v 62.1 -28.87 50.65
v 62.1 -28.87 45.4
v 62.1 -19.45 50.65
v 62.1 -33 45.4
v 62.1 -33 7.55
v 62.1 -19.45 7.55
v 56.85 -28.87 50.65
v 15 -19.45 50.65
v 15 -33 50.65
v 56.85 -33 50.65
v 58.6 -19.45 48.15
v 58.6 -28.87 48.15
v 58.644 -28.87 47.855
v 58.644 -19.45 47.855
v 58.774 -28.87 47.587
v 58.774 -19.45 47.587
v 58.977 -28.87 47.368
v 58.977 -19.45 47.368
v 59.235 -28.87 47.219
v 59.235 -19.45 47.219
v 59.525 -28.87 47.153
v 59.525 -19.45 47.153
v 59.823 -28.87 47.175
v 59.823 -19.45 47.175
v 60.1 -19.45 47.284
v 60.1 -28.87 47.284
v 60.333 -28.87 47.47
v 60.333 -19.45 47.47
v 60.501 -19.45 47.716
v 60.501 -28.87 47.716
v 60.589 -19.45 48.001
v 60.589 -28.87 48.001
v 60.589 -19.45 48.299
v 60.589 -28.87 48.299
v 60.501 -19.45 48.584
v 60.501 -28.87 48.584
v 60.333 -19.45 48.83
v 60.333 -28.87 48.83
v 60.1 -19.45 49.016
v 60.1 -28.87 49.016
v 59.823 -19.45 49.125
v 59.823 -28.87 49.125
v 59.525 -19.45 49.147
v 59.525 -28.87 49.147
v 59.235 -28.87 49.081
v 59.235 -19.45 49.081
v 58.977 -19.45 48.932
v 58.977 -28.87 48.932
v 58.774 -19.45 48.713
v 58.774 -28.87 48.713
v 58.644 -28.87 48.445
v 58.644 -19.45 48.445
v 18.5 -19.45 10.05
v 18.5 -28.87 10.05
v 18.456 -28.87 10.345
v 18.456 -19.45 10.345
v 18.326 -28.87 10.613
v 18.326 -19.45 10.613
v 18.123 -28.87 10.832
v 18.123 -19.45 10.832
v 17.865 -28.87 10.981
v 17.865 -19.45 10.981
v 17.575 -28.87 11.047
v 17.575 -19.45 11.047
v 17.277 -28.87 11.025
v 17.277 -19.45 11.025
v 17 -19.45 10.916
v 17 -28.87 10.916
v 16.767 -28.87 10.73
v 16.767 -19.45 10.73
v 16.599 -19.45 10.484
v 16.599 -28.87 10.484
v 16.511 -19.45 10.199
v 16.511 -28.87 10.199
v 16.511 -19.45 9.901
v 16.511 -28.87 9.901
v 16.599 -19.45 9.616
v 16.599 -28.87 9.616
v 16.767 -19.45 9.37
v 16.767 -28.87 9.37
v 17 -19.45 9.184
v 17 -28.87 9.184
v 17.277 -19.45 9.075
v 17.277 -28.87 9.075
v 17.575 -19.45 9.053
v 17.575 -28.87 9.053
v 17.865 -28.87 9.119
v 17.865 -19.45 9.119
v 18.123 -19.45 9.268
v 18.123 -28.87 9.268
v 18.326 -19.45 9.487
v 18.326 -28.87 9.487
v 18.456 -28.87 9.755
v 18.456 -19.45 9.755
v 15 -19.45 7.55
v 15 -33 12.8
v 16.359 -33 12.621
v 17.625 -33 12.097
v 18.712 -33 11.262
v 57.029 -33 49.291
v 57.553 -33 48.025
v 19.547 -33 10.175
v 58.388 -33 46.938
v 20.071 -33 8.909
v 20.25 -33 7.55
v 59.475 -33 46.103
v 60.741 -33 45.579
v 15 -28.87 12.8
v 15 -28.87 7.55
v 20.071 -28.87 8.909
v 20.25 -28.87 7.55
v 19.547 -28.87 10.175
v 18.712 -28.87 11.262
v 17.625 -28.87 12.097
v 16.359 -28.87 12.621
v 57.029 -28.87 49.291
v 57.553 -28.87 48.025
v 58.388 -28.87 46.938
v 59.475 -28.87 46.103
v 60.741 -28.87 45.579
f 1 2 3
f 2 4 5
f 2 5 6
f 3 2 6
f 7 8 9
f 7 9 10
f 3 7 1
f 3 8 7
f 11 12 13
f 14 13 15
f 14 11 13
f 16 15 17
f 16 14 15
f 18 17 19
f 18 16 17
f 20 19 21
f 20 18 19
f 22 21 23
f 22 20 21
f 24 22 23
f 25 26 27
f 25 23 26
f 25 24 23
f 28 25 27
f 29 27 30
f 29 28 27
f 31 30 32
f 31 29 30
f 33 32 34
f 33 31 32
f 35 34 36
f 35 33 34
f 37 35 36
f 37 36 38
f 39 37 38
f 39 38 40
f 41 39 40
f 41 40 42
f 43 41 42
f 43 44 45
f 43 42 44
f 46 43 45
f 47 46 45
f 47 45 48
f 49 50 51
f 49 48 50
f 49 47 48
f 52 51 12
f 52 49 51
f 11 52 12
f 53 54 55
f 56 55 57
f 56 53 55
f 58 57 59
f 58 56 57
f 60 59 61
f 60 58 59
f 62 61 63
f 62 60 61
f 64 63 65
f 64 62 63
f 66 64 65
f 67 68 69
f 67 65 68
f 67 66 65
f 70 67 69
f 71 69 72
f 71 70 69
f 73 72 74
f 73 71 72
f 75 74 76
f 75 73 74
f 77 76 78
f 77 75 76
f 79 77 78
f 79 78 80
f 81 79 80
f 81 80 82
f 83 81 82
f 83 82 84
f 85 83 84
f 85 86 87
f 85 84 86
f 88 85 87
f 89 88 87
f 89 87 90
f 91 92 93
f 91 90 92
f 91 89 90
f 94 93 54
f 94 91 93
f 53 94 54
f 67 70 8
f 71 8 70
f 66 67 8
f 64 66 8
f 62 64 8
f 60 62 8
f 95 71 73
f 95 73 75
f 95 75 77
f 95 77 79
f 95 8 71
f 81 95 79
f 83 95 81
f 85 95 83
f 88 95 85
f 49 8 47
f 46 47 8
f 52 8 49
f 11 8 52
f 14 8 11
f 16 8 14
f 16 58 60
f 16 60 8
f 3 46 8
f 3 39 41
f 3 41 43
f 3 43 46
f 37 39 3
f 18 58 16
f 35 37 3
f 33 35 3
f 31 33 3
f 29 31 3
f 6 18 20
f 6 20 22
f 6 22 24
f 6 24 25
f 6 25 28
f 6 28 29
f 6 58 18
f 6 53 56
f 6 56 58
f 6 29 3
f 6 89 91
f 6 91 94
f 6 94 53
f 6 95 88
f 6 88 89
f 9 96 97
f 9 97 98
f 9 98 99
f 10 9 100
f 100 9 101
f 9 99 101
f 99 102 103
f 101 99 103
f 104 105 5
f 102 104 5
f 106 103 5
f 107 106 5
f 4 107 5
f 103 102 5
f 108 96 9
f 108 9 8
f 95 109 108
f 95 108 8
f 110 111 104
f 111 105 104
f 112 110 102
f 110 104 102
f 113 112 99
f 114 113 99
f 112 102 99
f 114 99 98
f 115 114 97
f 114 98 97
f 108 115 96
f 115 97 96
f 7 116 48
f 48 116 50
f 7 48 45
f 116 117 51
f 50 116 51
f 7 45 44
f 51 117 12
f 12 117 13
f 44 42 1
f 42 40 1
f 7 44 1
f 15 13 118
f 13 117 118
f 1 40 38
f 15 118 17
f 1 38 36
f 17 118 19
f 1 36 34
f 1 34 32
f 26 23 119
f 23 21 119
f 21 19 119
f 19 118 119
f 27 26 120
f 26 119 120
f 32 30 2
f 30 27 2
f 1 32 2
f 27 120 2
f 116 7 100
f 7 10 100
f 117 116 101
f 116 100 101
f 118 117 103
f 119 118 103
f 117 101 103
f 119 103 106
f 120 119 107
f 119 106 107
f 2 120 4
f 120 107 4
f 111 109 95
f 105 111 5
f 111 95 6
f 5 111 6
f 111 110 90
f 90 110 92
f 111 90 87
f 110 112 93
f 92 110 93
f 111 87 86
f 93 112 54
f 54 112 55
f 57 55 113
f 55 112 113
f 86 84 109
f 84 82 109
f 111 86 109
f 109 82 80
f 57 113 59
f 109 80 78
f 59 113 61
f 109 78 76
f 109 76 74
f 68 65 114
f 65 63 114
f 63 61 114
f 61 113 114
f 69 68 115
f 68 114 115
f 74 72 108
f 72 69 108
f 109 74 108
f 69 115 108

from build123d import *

# Parameters (mm, degrees)
CYLINDER003_W             = 5.25
CYLINDER003_H             = 4.13
CYLINDER003_ANGLE         = 90
CYLINDER002_R             = 1
CYLINDER002_DEPTH         = 13.55
FUSION002_PLACEMENT_ANGLE = 180
CYLINDER001_W             = 5.25
CYLINDER001_H             = 4.13
CYLINDER001_ANGLE         = 90
CYLINDER_R                = 1
CYLINDER_DEPTH            = 13.55
BOX_W                     = 47.1
BOX_H                     = 13.55
BOX_DEPTH                 = 43.1


with BuildPart() as semicut001:
    # Cylinder003 → Cylinder003 (revolve)
    with BuildSketch(Plane(origin=(0, 4.13, 0), x_dir=(1, 0, 0), z_dir=(0, 0, -1))):
        with Locations((2.625, 2.065)):
            Rectangle(CYLINDER003_W, CYLINDER003_H)
    revolve(axis=Axis((0, 4.13, 0), (0, -1, 0)), revolution_arc=CYLINDER003_ANGLE)


with BuildPart() as ipscut001:
    # Cylinder002 → Cylinder002 (new body)
    with BuildSketch(Plane(origin=(2.5, 13.55, 2.5), x_dir=(1, 0, 0), z_dir=(0, -1, 0))):
        Circle(CYLINDER002_R)
    extrude(amount=CYLINDER002_DEPTH)

    # Fusion002: union semiCut001
    add(semicut001.part)


with BuildPart() as ipscut001_1:
    # Fusion002 placement: moved
    add(ipscut001.part.moved(Location((47.1, 0, 43.1))).rotate(Axis((47.1, 0, 43.1), (0, 1, 0)), FUSION002_PLACEMENT_ANGLE))


with BuildPart() as semicut:
    # Cylinder001 → Cylinder001 (revolve)
    with BuildSketch(Plane(origin=(0, 4.13, 0), x_dir=(1, 0, 0), z_dir=(0, 0, -1))):
        with Locations((2.625, 2.065)):
            Rectangle(CYLINDER001_W, CYLINDER001_H)
    revolve(axis=Axis((0, 4.13, 0), (0, -1, 0)), revolution_arc=CYLINDER001_ANGLE)


with BuildPart() as fusion003:
    # Cylinder → Cylinder (new body)
    with BuildSketch(Plane(origin=(2.5, 13.55, 2.5), x_dir=(1, 0, 0), z_dir=(0, -1, 0))):
        Circle(CYLINDER_R)
    extrude(amount=CYLINDER_DEPTH)

    # Fusion001: union semiCut
    add(semicut.part)

    # Fusion003: union ipsCut001
    add(ipscut001_1.part)


with BuildPart() as ips7100v:
    # Box → Box (new body)
    with BuildSketch(Plane.XY):
        with Locations((23.55, 6.775)):
            Rectangle(BOX_W, BOX_H)
    extrude(amount=BOX_DEPTH)

    # Cut: cut Fusion003
    add(fusion003.part, mode=Mode.SUBTRACT)


with BuildPart() as ips7100v_1:
    # Cut placement: moved
    add(ips7100v.part.moved(Location((15, -33, 7.55))))


solid = ips7100v_1.part
